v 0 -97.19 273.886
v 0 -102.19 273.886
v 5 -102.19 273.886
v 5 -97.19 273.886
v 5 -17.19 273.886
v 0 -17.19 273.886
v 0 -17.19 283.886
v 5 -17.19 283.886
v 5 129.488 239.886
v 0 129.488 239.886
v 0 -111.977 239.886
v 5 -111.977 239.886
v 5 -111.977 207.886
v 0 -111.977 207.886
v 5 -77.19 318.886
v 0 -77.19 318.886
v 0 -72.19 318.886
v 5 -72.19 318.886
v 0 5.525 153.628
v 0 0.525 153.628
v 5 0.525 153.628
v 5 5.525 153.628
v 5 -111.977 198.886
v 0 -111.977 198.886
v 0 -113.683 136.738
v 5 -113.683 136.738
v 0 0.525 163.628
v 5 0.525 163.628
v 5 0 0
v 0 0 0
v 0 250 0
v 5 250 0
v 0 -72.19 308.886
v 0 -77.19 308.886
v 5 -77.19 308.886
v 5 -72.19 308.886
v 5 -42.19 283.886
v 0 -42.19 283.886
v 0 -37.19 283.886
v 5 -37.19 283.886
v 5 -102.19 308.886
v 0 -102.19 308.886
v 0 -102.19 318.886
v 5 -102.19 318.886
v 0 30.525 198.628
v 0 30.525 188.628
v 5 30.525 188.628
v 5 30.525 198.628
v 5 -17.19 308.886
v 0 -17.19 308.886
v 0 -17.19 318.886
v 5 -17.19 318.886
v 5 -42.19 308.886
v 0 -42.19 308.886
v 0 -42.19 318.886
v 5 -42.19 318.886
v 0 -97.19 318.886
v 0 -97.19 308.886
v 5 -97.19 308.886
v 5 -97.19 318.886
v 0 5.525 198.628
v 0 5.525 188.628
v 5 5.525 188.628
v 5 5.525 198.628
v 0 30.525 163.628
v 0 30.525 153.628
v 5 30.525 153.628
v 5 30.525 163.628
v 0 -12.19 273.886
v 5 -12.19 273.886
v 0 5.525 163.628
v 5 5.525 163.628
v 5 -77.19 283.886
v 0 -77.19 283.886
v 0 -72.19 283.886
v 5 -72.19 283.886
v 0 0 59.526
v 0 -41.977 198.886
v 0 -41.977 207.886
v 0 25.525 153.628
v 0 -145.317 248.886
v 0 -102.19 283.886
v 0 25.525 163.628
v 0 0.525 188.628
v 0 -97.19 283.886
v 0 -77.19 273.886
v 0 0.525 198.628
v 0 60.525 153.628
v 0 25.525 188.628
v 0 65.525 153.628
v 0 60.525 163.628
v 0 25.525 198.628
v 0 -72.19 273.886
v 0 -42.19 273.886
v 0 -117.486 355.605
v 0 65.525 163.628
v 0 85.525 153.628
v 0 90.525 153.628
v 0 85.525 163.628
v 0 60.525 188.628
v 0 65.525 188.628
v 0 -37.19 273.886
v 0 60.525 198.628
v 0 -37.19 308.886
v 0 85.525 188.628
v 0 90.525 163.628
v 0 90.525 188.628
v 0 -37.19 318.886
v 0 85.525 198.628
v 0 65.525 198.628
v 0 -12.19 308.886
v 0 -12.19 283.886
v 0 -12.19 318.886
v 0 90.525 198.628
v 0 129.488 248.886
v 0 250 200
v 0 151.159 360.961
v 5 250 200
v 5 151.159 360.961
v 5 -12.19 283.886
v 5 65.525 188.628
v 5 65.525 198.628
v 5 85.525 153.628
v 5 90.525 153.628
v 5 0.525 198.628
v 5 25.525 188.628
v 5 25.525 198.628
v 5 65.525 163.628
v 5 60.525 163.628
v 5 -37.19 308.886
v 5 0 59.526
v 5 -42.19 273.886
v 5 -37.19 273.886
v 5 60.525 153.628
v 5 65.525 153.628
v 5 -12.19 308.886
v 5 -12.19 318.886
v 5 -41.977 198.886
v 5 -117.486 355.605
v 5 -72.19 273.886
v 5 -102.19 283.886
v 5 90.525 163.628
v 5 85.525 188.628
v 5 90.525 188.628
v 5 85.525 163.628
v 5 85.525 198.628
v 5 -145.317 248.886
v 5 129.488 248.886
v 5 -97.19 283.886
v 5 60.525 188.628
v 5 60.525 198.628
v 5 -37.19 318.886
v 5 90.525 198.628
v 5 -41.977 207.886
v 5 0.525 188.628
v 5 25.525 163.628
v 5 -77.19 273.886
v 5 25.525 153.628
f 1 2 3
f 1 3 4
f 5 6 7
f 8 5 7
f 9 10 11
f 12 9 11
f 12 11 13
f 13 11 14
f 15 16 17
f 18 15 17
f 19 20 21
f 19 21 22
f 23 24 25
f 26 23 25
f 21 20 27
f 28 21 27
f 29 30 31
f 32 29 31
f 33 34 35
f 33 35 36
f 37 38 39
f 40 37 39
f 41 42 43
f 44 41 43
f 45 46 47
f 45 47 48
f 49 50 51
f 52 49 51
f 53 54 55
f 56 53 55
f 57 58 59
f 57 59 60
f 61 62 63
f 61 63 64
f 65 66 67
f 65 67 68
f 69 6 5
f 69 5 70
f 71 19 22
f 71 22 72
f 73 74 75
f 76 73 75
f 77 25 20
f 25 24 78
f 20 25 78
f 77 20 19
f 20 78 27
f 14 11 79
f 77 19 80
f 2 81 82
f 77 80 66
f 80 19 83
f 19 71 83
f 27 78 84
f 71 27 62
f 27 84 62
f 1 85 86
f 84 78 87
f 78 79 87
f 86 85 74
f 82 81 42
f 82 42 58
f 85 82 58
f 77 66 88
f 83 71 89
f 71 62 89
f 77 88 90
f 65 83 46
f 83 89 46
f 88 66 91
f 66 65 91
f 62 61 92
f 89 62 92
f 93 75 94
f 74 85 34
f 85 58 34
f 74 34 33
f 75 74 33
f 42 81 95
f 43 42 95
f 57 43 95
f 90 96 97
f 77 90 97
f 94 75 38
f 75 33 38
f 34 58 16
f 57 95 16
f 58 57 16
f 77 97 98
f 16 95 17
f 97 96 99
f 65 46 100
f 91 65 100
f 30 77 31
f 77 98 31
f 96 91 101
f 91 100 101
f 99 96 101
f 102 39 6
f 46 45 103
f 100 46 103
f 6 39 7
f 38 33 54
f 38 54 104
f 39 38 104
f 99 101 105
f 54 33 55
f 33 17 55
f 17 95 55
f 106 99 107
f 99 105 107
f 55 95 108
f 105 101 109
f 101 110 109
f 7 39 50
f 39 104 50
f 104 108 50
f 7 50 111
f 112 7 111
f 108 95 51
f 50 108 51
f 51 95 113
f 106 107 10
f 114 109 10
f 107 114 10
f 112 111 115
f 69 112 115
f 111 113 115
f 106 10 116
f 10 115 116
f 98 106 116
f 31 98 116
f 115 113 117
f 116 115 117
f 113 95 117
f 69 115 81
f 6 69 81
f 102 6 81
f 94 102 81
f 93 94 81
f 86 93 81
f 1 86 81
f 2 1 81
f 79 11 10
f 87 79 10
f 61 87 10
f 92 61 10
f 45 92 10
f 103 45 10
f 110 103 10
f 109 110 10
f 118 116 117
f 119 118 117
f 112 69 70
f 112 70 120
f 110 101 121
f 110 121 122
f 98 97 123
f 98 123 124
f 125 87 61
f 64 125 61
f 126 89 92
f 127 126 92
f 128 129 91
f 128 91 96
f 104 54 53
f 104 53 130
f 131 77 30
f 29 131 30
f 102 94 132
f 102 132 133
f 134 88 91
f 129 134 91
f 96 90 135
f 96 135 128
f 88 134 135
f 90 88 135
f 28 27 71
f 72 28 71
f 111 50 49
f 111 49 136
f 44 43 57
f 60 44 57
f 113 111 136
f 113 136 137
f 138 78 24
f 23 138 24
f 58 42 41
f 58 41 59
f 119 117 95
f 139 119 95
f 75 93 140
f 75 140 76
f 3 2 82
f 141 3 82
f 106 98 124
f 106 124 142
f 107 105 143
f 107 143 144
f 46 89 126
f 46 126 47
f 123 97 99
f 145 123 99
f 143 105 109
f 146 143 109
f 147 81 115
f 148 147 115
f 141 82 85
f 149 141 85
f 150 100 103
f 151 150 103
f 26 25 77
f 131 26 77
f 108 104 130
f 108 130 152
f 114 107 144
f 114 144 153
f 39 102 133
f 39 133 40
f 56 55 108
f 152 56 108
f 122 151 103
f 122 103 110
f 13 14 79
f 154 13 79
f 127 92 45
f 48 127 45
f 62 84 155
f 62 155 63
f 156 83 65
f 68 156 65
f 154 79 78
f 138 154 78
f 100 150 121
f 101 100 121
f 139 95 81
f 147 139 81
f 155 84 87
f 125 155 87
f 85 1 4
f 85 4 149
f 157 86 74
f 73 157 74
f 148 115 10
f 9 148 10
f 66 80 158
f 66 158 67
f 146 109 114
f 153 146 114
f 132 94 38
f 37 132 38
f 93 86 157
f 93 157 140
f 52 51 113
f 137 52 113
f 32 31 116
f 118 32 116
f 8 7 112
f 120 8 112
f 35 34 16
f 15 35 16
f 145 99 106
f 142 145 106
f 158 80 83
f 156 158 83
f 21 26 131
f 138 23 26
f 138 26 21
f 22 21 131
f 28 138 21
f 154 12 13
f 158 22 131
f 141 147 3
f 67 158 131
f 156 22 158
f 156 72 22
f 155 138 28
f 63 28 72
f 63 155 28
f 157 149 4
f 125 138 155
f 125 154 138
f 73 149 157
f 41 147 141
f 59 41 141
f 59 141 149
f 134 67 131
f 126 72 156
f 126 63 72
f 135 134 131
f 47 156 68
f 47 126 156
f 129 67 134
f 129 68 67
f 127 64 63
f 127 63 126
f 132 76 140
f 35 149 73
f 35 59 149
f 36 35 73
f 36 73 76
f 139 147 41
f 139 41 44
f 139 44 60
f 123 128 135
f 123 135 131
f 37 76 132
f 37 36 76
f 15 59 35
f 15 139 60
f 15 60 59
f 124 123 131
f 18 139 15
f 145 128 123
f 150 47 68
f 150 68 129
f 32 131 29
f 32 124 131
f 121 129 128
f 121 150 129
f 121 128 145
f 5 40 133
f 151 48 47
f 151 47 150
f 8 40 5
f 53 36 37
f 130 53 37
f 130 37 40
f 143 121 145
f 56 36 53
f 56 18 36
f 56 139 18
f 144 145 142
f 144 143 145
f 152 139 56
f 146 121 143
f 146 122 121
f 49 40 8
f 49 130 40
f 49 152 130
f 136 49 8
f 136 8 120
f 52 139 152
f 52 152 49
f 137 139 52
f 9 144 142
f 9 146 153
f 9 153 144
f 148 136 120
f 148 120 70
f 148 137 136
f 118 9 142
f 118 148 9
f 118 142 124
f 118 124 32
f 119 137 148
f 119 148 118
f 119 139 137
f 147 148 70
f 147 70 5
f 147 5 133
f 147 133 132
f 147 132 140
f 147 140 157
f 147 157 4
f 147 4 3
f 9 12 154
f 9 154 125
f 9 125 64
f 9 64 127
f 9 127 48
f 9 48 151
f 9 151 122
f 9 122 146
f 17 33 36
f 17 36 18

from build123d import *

# Parameters (mm, degrees)
F0_W     = 5
F0_H     = 10
F1_DEPTH = 5


# Not quite as in the source:
# - a feature names something its author has since deleted; it is built from what else it names


with BuildPart() as f1:
    # F0 (on Right) → F1 (new body)
    with BuildSketch(Plane.YZ):
        Polygon((0, 59.5256769704), (0, 0), (250, 0), (250, 200), (151.1586640426, 360.9612668205), (-117.4855289776, 355.6046891351), (-145.3168663312, 248.8862540722), (129.4880870227, 248.8862540722), (129.4880870227, 239.8862540722), (-111.9774808093, 239.8862540722), (-111.9774808093, 207.8862540722), (-41.9774808093, 207.8862540722), (-41.9774808093, 198.8862540722), (-111.9774808093, 198.8862540722), (-113.683141768, 136.7378532887), align=None)
        with Locations((3.0250263214, 158.6281073093)):
            Rectangle(F0_W, F0_H, mode=Mode.SUBTRACT)
        with Locations((28.0250263214, 158.6281073093)):
            Rectangle(F0_W, F0_H, mode=Mode.SUBTRACT)
        with Locations((63.0250263214, 158.6281073093)):
            Rectangle(F0_W, F0_H, mode=Mode.SUBTRACT)
        with Locations((88.0250263214, 158.6281073093)):
            Rectangle(F0_W, F0_H, mode=Mode.SUBTRACT)
        with Locations((3.0250263214, 193.6281073093)):
            Rectangle(F0_W, F0_H, mode=Mode.SUBTRACT)
        with Locations((28.0250263214, 193.6281073093)):
            Rectangle(F0_W, F0_H, mode=Mode.SUBTRACT)
        with Locations((-99.690104425, 278.8862540722)):
            Rectangle(F0_W, F0_H, mode=Mode.SUBTRACT)
        with Locations((-99.690104425, 313.8862540722)):
            Rectangle(F0_W, F0_H, mode=Mode.SUBTRACT)
        with Locations((-74.690104425, 278.8862540722)):
            Rectangle(F0_W, F0_H, mode=Mode.SUBTRACT)
        with Locations((-74.690104425, 313.8862540722)):
            Rectangle(F0_W, F0_H, mode=Mode.SUBTRACT)
        with Locations((-39.690104425, 278.8862540722)):
            Rectangle(F0_W, F0_H, mode=Mode.SUBTRACT)
        with Locations((-14.690104425, 278.8862540722)):
            Rectangle(F0_W, F0_H, mode=Mode.SUBTRACT)
        with Locations((-39.690104425, 313.8862540722)):
            Rectangle(F0_W, F0_H, mode=Mode.SUBTRACT)
        with Locations((-14.690104425, 313.8862540722)):
            Rectangle(F0_W, F0_H, mode=Mode.SUBTRACT)
        with Locations((63.0250263214, 193.6281073093)):
            Rectangle(F0_W, F0_H, mode=Mode.SUBTRACT)
        with Locations((88.0250263214, 193.6281073093)):
            Rectangle(F0_W, F0_H, mode=Mode.SUBTRACT)
    extrude(amount=F1_DEPTH)


solid = f1.part
